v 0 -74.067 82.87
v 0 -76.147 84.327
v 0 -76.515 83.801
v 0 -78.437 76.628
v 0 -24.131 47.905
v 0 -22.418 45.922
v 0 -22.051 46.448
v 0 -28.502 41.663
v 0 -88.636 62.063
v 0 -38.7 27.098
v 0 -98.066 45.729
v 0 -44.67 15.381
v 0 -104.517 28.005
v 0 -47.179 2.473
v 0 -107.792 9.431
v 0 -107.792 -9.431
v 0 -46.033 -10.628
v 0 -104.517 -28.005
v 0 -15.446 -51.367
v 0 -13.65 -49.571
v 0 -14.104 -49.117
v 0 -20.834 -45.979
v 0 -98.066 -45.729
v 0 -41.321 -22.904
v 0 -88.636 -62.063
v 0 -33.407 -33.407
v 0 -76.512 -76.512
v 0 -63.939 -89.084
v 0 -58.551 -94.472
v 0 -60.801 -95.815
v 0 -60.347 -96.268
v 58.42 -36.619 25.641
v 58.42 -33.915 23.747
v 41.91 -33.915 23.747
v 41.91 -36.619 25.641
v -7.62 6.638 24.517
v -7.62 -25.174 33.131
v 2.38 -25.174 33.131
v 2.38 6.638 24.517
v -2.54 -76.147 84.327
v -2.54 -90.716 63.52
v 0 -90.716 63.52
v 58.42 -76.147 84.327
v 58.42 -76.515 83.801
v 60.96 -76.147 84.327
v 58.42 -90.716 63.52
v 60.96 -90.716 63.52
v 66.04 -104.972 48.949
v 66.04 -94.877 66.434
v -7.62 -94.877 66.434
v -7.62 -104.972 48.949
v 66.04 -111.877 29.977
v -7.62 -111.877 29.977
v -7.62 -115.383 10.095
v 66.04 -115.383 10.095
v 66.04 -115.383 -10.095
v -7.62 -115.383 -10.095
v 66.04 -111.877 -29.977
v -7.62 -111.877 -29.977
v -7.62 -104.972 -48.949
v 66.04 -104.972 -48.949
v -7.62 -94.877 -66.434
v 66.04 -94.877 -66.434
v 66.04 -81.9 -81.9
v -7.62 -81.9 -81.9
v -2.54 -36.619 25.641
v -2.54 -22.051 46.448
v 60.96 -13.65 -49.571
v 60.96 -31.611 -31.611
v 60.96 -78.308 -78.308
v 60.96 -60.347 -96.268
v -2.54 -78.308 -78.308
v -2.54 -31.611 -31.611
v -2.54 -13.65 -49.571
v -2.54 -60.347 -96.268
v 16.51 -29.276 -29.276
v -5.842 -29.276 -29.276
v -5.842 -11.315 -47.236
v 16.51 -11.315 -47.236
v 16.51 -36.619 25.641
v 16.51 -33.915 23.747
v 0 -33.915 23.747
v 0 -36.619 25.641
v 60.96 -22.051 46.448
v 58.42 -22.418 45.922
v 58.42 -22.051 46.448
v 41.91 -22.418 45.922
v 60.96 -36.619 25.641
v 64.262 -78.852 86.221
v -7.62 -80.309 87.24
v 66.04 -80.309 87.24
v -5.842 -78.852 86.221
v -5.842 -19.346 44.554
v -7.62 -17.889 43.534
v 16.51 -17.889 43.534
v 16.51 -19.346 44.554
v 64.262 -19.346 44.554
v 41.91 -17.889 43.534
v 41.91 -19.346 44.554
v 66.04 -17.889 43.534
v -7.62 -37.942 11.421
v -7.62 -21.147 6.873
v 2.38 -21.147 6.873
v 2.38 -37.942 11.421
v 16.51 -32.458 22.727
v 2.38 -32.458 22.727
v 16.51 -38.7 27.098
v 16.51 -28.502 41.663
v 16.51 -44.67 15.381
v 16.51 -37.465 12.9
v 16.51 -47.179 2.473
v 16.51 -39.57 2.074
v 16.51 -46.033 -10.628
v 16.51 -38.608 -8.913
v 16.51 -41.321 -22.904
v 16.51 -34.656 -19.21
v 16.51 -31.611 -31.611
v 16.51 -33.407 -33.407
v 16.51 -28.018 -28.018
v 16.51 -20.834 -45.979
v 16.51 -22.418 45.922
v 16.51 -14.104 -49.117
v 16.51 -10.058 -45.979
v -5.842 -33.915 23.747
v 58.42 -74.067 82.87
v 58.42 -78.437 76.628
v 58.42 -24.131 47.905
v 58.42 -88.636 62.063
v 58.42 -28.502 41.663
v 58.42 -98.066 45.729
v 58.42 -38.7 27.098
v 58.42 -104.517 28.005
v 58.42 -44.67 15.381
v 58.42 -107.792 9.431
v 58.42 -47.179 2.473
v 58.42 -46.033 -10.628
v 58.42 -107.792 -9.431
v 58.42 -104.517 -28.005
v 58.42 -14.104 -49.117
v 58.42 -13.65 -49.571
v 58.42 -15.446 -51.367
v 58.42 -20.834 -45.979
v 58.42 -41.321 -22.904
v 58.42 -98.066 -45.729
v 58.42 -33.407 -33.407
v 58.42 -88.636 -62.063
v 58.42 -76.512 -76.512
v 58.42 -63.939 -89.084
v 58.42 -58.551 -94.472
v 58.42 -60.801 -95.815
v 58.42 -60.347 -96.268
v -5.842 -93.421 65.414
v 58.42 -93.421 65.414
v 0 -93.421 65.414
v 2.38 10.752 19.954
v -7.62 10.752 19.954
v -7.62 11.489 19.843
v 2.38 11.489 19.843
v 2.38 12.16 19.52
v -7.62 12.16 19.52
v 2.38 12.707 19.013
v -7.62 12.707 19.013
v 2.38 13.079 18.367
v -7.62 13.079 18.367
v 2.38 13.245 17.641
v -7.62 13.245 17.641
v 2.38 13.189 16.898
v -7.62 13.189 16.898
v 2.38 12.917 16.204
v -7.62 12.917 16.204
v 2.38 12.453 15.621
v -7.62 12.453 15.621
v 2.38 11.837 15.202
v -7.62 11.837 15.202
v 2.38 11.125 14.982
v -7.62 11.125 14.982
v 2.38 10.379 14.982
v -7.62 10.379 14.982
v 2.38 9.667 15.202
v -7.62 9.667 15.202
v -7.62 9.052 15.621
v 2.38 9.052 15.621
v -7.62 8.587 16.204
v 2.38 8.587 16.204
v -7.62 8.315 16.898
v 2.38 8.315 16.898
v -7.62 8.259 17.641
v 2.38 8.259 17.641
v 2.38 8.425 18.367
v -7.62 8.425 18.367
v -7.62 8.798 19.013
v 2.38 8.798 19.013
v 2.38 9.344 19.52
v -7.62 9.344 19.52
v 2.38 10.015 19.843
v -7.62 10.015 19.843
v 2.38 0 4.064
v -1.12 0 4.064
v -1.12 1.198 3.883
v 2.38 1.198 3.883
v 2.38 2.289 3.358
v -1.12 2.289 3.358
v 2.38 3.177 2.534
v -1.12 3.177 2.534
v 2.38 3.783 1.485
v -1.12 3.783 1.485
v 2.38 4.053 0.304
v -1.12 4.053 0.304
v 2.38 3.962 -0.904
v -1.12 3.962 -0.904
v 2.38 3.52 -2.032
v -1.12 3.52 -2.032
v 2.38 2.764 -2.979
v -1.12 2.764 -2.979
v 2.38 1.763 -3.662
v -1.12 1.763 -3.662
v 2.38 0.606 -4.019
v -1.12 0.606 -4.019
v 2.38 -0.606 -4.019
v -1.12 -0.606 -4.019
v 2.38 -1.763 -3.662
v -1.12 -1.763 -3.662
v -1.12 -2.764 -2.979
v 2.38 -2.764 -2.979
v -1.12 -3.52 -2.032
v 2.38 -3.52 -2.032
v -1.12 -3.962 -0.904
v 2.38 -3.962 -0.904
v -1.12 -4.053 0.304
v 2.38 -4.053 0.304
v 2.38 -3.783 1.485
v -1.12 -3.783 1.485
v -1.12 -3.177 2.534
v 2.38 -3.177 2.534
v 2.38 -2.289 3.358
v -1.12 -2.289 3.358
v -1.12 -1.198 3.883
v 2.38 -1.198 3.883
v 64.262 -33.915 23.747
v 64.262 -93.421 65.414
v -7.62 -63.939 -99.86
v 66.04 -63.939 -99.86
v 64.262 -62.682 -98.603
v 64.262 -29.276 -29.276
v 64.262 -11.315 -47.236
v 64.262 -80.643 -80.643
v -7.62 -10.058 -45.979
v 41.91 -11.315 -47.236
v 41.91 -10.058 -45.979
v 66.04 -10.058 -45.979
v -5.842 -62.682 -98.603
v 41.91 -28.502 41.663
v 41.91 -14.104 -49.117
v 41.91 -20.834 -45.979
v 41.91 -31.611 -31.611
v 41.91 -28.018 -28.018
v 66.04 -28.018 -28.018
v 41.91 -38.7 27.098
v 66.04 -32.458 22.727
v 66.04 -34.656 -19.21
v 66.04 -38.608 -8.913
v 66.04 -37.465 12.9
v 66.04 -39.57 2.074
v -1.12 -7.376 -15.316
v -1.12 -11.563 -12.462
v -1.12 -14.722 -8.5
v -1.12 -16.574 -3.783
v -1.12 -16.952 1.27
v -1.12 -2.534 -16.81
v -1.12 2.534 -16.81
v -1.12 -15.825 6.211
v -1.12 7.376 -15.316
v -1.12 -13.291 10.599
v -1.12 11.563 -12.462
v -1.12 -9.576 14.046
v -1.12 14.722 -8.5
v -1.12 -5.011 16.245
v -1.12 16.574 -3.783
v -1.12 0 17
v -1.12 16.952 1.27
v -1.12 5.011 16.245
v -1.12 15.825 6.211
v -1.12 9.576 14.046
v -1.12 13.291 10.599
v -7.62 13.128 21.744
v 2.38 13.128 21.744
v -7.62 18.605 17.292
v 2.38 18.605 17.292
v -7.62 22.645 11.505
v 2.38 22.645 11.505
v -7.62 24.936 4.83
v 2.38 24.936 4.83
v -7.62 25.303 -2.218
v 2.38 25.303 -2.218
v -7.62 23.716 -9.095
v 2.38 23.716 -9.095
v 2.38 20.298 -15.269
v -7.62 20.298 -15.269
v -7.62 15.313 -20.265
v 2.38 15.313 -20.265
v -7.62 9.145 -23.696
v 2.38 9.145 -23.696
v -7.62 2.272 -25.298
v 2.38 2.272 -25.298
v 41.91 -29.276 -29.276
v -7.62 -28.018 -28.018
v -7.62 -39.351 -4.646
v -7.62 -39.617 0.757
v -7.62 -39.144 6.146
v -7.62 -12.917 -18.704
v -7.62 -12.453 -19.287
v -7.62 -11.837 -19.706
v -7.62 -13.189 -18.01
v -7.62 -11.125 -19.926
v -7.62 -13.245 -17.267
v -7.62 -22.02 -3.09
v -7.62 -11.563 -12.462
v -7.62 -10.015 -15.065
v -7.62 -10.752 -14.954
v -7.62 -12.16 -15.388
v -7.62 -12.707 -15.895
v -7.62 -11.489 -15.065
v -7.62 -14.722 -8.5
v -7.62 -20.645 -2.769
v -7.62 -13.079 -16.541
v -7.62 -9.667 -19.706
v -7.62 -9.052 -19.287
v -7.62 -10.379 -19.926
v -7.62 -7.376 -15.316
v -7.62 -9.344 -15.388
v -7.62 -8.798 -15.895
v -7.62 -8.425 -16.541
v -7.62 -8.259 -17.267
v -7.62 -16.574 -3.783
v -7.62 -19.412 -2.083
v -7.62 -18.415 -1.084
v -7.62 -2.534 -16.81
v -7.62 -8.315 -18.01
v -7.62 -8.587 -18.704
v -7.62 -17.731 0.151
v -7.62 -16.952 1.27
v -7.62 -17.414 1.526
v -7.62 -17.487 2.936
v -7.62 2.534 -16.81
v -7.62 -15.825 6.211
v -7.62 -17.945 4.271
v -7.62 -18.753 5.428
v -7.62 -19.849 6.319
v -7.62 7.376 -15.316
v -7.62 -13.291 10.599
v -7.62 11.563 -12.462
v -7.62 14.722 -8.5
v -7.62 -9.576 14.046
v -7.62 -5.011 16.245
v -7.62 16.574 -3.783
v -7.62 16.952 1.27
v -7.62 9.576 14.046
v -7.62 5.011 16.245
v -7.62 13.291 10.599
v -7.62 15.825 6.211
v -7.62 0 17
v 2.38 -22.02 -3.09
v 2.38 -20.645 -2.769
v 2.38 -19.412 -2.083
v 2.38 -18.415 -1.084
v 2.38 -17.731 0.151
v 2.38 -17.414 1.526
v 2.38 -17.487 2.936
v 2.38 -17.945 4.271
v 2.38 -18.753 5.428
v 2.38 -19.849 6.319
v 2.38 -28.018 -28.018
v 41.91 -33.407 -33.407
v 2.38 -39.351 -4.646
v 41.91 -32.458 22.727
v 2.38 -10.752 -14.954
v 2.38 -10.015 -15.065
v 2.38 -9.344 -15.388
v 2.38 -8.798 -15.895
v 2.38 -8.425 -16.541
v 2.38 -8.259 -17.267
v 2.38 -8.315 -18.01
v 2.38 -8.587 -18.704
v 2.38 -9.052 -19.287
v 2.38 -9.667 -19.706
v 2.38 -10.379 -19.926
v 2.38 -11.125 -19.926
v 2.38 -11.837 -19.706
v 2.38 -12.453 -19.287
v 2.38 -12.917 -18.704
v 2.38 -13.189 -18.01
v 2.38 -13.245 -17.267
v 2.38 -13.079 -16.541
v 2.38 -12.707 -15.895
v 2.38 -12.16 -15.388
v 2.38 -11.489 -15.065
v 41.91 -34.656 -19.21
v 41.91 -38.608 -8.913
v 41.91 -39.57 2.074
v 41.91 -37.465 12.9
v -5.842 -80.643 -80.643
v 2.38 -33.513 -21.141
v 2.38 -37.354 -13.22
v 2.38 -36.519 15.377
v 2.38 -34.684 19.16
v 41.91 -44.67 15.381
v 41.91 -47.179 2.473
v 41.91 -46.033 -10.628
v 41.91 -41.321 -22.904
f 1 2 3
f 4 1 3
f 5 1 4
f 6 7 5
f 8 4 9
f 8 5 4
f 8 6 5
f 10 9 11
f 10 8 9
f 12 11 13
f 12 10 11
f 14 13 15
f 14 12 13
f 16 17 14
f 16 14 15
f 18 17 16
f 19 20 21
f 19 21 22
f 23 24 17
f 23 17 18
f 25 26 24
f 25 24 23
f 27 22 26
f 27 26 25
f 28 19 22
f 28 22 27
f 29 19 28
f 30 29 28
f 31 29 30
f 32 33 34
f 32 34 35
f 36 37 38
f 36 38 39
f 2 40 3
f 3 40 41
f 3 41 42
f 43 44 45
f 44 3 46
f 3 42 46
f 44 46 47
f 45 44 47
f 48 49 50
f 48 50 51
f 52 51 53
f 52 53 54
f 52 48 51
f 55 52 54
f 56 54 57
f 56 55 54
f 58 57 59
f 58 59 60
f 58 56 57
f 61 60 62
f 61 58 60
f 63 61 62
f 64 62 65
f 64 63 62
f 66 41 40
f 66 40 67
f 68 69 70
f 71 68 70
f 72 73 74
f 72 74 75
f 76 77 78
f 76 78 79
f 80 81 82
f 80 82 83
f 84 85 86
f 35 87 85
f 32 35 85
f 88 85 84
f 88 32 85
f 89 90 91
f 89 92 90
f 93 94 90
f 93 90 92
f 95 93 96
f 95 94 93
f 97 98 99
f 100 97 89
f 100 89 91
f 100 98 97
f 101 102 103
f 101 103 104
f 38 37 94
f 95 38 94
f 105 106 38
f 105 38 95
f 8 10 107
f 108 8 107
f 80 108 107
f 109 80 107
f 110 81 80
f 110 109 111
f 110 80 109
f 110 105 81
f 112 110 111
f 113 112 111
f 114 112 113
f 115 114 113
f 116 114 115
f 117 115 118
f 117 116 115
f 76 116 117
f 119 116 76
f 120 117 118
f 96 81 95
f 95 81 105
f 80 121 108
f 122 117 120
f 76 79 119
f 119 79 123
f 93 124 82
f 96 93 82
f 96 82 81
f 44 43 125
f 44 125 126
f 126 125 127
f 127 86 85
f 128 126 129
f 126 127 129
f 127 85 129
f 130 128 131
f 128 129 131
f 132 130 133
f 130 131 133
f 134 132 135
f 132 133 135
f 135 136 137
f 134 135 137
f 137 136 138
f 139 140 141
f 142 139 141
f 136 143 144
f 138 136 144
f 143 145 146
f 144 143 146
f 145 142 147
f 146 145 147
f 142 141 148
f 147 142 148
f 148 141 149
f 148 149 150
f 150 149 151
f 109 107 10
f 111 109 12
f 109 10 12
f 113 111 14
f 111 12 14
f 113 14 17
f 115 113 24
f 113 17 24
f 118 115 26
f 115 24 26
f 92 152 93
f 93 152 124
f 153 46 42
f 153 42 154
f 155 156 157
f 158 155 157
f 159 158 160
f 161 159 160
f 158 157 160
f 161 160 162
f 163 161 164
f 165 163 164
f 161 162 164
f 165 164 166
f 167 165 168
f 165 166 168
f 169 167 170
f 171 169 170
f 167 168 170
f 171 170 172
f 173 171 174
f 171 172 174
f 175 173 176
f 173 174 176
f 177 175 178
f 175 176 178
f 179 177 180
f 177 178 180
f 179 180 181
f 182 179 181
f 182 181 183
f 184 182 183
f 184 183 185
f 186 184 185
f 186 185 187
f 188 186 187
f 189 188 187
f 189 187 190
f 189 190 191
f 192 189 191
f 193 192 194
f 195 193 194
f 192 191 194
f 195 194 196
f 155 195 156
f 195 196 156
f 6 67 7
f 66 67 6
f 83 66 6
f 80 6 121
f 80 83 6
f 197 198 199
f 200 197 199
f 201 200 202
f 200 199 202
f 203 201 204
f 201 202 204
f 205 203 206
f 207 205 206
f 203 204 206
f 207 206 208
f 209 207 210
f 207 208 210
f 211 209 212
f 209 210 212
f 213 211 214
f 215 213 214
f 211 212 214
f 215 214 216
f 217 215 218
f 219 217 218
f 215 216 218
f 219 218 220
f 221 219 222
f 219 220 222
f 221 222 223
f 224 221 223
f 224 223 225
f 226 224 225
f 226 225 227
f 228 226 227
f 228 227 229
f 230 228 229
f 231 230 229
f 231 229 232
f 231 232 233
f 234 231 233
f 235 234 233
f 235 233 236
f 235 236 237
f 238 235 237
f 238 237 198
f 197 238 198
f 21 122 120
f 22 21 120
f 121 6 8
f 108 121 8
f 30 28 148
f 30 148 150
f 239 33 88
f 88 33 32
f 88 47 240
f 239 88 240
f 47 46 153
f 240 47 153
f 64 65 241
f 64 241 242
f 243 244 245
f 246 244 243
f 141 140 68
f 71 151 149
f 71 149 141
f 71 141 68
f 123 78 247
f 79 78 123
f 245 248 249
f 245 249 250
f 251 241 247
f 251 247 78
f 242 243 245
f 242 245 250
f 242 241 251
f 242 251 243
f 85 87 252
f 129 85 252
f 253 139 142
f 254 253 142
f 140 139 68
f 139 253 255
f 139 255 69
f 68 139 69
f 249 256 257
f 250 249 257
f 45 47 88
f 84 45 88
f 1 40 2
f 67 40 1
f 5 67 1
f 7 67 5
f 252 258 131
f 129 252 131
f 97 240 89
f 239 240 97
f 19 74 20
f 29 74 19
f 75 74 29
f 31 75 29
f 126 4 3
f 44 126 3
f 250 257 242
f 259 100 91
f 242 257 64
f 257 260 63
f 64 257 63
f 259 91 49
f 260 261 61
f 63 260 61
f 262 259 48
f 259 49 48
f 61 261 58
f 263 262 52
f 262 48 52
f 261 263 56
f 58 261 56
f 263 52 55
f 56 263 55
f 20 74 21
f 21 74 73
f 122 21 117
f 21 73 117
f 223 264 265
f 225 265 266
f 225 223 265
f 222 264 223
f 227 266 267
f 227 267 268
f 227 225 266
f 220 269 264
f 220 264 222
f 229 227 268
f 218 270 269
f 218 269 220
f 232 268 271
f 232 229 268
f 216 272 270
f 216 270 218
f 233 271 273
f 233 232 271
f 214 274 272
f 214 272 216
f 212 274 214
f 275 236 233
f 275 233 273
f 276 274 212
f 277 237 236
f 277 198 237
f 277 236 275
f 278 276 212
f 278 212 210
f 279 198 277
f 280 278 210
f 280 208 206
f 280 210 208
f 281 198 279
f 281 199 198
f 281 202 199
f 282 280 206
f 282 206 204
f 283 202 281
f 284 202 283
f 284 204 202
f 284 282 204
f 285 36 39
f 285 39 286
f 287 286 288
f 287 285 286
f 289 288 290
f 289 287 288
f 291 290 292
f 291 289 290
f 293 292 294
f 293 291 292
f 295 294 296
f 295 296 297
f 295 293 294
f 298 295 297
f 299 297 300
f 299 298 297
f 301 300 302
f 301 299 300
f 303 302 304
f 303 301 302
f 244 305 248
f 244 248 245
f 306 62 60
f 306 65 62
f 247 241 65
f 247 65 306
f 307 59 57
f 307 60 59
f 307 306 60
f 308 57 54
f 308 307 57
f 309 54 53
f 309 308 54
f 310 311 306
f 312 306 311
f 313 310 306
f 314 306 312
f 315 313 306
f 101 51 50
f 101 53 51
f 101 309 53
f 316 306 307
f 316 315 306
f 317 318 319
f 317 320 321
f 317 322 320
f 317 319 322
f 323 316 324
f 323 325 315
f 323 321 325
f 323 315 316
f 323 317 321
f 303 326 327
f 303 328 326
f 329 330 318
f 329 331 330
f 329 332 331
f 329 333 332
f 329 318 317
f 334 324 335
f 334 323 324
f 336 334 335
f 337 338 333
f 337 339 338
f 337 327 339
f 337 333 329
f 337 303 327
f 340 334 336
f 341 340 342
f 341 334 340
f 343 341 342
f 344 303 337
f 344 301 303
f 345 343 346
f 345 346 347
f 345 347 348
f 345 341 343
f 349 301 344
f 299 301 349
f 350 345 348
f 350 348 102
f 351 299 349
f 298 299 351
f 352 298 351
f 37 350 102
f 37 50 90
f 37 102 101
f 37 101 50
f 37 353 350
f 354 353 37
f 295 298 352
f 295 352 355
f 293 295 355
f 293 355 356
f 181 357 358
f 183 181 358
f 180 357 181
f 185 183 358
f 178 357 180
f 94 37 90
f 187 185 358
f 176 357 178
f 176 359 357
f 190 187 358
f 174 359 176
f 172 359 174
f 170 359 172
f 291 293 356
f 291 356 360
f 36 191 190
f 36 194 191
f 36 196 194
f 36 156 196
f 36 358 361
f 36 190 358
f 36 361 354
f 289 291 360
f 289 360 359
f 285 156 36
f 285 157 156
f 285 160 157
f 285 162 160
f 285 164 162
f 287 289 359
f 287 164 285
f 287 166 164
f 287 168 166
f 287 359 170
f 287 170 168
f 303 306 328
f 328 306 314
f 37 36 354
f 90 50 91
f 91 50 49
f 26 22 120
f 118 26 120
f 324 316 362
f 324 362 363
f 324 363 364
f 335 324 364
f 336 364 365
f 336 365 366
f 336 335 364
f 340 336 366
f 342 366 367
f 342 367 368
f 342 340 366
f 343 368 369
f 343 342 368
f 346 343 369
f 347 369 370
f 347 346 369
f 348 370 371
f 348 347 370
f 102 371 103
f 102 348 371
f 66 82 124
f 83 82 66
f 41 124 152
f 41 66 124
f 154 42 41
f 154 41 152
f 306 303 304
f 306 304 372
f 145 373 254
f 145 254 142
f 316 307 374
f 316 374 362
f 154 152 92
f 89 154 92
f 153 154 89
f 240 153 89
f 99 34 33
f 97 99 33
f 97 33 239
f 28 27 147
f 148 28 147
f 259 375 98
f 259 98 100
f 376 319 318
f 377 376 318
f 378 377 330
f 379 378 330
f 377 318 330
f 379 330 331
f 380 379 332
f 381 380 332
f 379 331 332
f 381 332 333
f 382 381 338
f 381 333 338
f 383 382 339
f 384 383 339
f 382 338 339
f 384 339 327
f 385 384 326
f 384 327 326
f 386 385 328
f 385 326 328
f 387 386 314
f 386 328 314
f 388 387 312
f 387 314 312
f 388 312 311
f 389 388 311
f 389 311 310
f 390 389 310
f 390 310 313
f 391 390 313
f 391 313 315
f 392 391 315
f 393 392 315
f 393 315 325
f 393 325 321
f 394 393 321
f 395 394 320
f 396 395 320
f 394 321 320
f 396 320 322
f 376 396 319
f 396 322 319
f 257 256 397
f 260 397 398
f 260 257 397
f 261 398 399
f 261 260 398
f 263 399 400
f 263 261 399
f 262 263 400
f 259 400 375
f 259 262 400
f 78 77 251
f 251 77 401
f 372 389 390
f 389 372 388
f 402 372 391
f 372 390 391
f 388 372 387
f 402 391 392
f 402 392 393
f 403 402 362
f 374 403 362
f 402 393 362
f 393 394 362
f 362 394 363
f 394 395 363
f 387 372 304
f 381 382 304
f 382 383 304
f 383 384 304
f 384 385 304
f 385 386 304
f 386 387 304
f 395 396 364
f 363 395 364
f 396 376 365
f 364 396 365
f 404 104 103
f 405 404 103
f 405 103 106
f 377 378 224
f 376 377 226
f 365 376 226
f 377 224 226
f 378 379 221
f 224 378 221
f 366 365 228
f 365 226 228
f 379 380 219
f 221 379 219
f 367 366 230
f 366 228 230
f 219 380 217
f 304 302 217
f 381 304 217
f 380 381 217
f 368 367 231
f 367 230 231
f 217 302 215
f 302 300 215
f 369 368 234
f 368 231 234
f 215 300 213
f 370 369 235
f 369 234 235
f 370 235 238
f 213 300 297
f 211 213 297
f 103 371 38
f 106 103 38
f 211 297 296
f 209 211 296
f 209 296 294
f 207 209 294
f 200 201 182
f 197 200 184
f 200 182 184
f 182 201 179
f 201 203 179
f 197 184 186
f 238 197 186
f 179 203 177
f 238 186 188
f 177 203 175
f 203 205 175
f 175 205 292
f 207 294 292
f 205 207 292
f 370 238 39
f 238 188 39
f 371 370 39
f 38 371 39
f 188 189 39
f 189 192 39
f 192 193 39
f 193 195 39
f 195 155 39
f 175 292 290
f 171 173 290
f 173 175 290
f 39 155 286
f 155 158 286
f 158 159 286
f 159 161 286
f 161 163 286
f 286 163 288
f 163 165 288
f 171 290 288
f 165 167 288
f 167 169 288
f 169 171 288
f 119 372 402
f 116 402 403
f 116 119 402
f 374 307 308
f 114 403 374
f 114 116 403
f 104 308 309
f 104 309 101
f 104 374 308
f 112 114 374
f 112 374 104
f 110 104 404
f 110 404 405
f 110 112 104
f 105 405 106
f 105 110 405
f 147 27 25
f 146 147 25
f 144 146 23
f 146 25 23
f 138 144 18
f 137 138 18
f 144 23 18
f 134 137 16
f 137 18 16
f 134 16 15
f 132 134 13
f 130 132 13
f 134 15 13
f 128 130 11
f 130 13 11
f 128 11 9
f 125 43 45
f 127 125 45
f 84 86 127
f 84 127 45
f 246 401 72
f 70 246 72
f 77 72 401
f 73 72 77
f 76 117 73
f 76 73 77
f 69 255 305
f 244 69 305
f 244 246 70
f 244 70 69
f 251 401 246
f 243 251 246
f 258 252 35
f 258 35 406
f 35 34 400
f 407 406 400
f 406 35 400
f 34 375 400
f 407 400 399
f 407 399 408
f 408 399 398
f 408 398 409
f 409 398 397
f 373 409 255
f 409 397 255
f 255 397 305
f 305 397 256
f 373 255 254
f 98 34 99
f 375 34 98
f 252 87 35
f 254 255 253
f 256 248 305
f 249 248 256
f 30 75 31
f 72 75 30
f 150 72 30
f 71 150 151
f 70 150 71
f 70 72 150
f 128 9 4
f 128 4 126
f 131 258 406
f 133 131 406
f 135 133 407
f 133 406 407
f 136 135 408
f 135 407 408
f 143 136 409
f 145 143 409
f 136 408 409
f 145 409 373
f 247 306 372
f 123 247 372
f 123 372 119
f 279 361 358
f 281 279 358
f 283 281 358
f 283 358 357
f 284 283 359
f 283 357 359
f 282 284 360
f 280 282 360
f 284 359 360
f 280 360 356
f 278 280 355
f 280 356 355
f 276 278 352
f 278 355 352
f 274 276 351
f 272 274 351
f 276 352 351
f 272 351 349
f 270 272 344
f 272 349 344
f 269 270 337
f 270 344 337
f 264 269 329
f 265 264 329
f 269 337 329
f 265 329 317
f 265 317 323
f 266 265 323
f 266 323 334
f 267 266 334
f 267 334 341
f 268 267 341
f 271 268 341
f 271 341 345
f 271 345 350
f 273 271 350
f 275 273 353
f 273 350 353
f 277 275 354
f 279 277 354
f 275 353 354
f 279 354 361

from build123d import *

# Parameters (mm, degrees)
BOSS_EXTRUDE2_DEPTH   = 58.42
BOSS_EXTRUDE2_2_DEPTH = 58.42
BOSS_EXTRUDE3_DEPTH   = 7.62
SKETCH6_W             = 73.66
SKETCH6_H             = 76.2
SKETCH6_W_2           = 70.104
SKETCH6_H_2           = 72.644
SKETCH6_W_3           = 63.5
SKETCH6_H_3           = 66.04
SKETCH6_W_4           = 58.42
SKETCH6_H_4           = 60.96
BOSS_EXTRUDE4_DEPTH   = 25.4
SKETCH7_W             = 73.66
SKETCH7_H             = 76.2
SKETCH7_W_2           = 70.104
SKETCH7_H_2           = 72.644
SKETCH7_W_3           = 63.5
SKETCH7_H_3           = 66.04
SKETCH7_W_4           = 58.42
SKETCH7_H_4           = 60.96
BOSS_EXTRUDE5_DEPTH   = 25.4
CHAMFER1_SIZE         = 2.773453185
CHAMFER1_SIZE_2       = 7.62
CUT_EXTRUDE3_REACH    = 158.41
SKETCH10_W            = 25.4
SKETCH10_H            = 177.72143494
SKETCH11_R            = 4.064
SKETCH11_R_2          = 2.5
BOSS_EXTRUDE6_DEPTH   = 10
SKETCH12_R            = 17
CUT_EXTRUDE4_DEPTH    = 6.5


with BuildPart() as part:
    # Sketch3 → Boss-Extrude2 (new body)
    with BuildSketch(Plane(origin=(0, 0, 0), x_dir=(0, 0, -1), z_dir=(1, 0, 0))):
        with BuildLine():
            Line((-62.063264719, -88.6355278), (-66.433917164, -94.877466378))
            ThreePointArc((-66.433917164, -94.877466378), (10.094726748, -115.383254712), (81.899935824, -81.899935824))
            Line((81.899935824, -81.899935824), (76.511782152, -76.511782152))
            ThreePointArc((76.511782152, -76.511782152), (9.430599988, -107.792251112), (-62.063264719, -88.6355278))
        make_face()
    extrude(amount=BOSS_EXTRUDE2_DEPTH)



with BuildPart() as body_2:
    # Sketch3 → Boss-Extrude2 2 (new body)
    with BuildSketch(Plane(origin=(0, 0, 0), x_dir=(0, 0, -1), z_dir=(1, 0, 0))):
        with BuildLine():
            ThreePointArc((28.018399098, -28.018399098), (3.453459151, -39.473218717), (-22.727392714, -32.458080603))
            Line((-22.727392714, -32.458080603), (-27.098045159, -38.70001918))
            ThreePointArc((-27.098045159, -38.70001918), (4.11758591, -47.064222317), (33.40655277, -33.40655277))
            Line((33.40655277, -33.40655277), (28.018399098, -28.018399098))
        make_face()
    extrude(amount=BOSS_EXTRUDE2_2_DEPTH)


with BuildPart() as part_1:
    add(part.part)

    add(body_2.part)  # Boss-Extrude3 merges body 2
    # Sketch4 → Boss-Extrude3 (add)
    with BuildSketch(Plane(origin=(58.42, 0, 0), x_dir=(0, 0, -1), z_dir=(1, 0, 0))):
        with BuildLine():
            Line((-22.727392714, -32.458080603), (-66.433917164, -94.877466378))
            ThreePointArc((-66.433917164, -94.877466378), (10.094726748, -115.383254712), (81.899935824, -81.899935824))
            Line((81.899935824, -81.899935824), (28.018399098, -28.018399098))
            ThreePointArc((28.018399098, -28.018399098), (3.453459151, -39.473218717), (-22.727392714, -32.458080603))
        make_face()
    boss_extrude3 = extrude(amount=BOSS_EXTRUDE3_DEPTH)

    # Mirror1: Boss-Extrude3 across plane
    add(boss_extrude3.mirror(Plane.ZY.offset(-29.21)))

    # Sketch6 → Boss-Extrude4 (add)
    # profile 1 of 2: a face of its own
    with BuildSketch(Plane(origin=(0, 0, 0), x_dir=(1, 0, 0), z_dir=(0, 0.5735764363510462, 0.8191520442889917))):
        with Locations((29.21, -77.724)):
            Rectangle(SKETCH6_W, SKETCH6_H)
        with Locations((29.21, -77.724)):
            Rectangle(SKETCH6_W_2, SKETCH6_H_2, mode=Mode.SUBTRACT)
    # profile 2 of 2: a face of its own
    with BuildSketch(Plane(origin=(0, 0, 0), x_dir=(1, 0, 0), z_dir=(0, 0.5735764363510462, 0.8191520442889917))):
        with Locations((29.21, -77.724)):
            Rectangle(SKETCH6_W_3, SKETCH6_H_3)
        with Locations((29.21, -77.724)):
            Rectangle(SKETCH6_W_4, SKETCH6_H_4, mode=Mode.SUBTRACT)
    extrude(amount=BOSS_EXTRUDE4_DEPTH)

    # Sketch7 → Boss-Extrude5 (add)
    # profile 1 of 2: a face of its own
    with BuildSketch(Plane(origin=(0, 0, 0), x_dir=(1, 0, 0), z_dir=(0, 0.7071067811865503, -0.7071067811865447))):
        with Locations((29.21, 77.724)):
            Rectangle(SKETCH7_W, SKETCH7_H)
        with Locations((29.21, 77.724)):
            Rectangle(SKETCH7_W_2, SKETCH7_H_2, mode=Mode.SUBTRACT)
    # profile 2 of 2: a face of its own
    with BuildSketch(Plane(origin=(0, 0, 0), x_dir=(1, 0, 0), z_dir=(0, 0.7071067811865503, -0.7071067811865447))):
        with Locations((29.21, 77.724)):
            Rectangle(SKETCH7_W_3, SKETCH7_H_3)
        with Locations((29.21, 77.724)):
            Rectangle(SKETCH7_W_4, SKETCH7_H_4, mode=Mode.SUBTRACT)
    extrude(amount=BOSS_EXTRUDE5_DEPTH)

    # Chamfer1
    # the kernel refuses this chamfer: 7.62, 2.773453185 mm, written as the material it takes off along each edge
    with BuildSketch(Plane(origin=(58.42, -15.446040528, -51.367065013), x_dir=(0, 0.7736626875489875, 0.6335977003544738), z_dir=(-1, 0, 0)), Plane(origin=(0, -24.131177697, 47.904507084), x_dir=(0, 0.8719320989550161, -0.489626811778011), z_dir=(1, 0, 0))) as chamfer1_piece_1:
        Polygon((CHAMFER1_SIZE * 0.995083363221, -CHAMFER1_SIZE * 0.0990409022559), (-CHAMFER1_SIZE_2 * 0.0990409022521, -CHAMFER1_SIZE_2 * 0.995083363182), (0, 0), align=None)
    extrude(amount=58.42, mode=Mode.SUBTRACT)
    with BuildSketch(Plane(origin=(0, -58.551269909, -94.472294394), x_dir=(0, -0.6977227871251116, 0.7163678610367485), z_dir=(1, 0, 0)), Plane(origin=(58.42, -74.066686317, 82.869726644), x_dir=(0, -0.562726836605906, -0.8266429140587307), z_dir=(-1, 0, 0))) as chamfer1_piece_2:
        Polygon((CHAMFER1_SIZE_2 * 0.999913086528, CHAMFER1_SIZE_2 * 0.0131840581986), (-CHAMFER1_SIZE * 0.0131840581992, CHAMFER1_SIZE * 0.999913086567), (0, 0), align=None)
    extrude(amount=58.42, mode=Mode.SUBTRACT)

    # Sketch10 → Cut-Extrude3 (cut, up to next)
    with BuildSketch(Plane(origin=(0, -13.973562988, -1.22252835), x_dir=(-1, 0, 0), z_dir=(0, -0.9961946980917453, -0.08715574274766034)), mode=Mode.PRIVATE) as cut_extrude3_sk1:
        with Locations((-29.21, 6.675062398)):
            Rectangle(SKETCH10_W, SKETCH10_H)
    cut_extrude3_tool1 = extrude(cut_extrude3_sk1.sketch, amount=CUT_EXTRUDE3_REACH, mode=Mode.PRIVATE) & part_1.part
    add(cut_extrude3_tool1.solids().sort_by_distance((29.21, -13.391793, -7.87219))[0], mode=Mode.SUBTRACT)

    # Sketch11 → Boss-Extrude6 (add)
    with BuildSketch(Plane.ZY.offset(7.62)):
        with BuildLine():
            Line((-25.298191602, 2.271893855), (-28.018399098, -28.018399098))
            ThreePointArc((-28.018399098, -28.018399098), (-17.287205304, -35.654086845), (-4.646100514, -39.350668686))
            Line((-4.646100514, -39.350668686), (-3.089724987, -22.01997949))
            ThreePointArc((-3.089724987, -22.01997949), (1.526343902, -17.41376085), (6.873353249, -21.146699798))
            Line((6.873353249, -21.146699798), (11.420958182, -37.942365374))
            ThreePointArc((11.420958182, -37.942365374), (17.292970019, -35.651291196), (22.727392714, -32.458080603))
            Line((22.727392714, -32.458080603), (33.130623676, -25.173659861))
            Line((33.130623676, -25.173659861), (24.517199578, 6.638292315))
            ThreePointArc((24.517199578, 6.638292315), (-2.217847157, 25.302987057), (-25.298191602, 2.271893855))
        make_face()
        Circle(SKETCH11_R, mode=Mode.SUBTRACT)
        with Locations((-17.454015953, -10.75208478)):
            Circle(SKETCH11_R_2, mode=Mode.SUBTRACT)
        with Locations((17.454015953, 10.75208478)):
            Circle(SKETCH11_R_2, mode=Mode.SUBTRACT)
    extrude(amount=-BOSS_EXTRUDE6_DEPTH)

    # Sketch12 → Cut-Extrude4 (cut)
    with BuildSketch(Plane.ZY.offset(7.62)):
        Circle(SKETCH12_R)
    extrude(amount=-CUT_EXTRUDE4_DEPTH, mode=Mode.SUBTRACT)


solid = part_1.part
